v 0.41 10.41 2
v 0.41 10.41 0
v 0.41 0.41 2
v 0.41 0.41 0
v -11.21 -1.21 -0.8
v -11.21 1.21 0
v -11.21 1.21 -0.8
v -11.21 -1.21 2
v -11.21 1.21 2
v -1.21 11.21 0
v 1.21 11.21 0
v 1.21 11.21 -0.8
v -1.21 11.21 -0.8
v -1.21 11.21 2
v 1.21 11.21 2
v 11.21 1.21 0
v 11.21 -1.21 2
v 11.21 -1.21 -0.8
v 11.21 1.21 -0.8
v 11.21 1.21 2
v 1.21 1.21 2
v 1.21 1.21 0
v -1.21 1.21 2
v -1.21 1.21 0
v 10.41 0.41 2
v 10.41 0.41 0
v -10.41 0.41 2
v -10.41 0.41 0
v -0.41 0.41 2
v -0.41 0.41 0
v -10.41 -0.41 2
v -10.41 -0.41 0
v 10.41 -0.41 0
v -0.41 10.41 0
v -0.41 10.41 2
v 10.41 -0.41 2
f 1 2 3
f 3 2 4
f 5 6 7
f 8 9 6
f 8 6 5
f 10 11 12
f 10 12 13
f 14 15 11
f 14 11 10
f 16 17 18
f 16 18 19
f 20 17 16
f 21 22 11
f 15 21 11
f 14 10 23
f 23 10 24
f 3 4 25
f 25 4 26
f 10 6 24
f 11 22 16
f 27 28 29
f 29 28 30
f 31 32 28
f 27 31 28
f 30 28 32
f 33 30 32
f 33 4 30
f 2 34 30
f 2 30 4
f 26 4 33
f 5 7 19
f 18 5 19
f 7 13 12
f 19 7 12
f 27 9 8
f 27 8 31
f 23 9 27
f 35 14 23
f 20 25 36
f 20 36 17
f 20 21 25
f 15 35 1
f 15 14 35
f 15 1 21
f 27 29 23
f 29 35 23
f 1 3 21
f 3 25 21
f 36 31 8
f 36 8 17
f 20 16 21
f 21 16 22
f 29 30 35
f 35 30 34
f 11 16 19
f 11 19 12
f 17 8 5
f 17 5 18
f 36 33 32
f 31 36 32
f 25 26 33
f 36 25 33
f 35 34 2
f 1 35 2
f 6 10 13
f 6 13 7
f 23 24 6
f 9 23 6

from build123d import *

# Parameters (mm, degrees)
F0_W     = 0.82
F0_H     = 0.8
F1_DEPTH = 2
F2_DEPTH = 0.8


with BuildPart() as f1:
    # F0 (on Top) → F1 (new body)
    with BuildSketch(Plane.XY):
        Polygon((-10.41, 0.41), (-0.41, 0.41), (-0.41, 10.41), (0.41, 10.41), (0.41, 0.41), (10.41, 0.41), (10.41, -0.41), (0.41, -0.41), (0.41, -1.21), (1.21, -1.21), (11.21, -1.21), (11.21, 1.21), (1.21, 1.21), (1.21, 11.21), (-1.21, 11.21), (-1.21, 1.21), (-11.21, 1.21), (-11.21, -1.21), (-1.21, -1.21), (-0.41, -1.21), (-0.41, -0.41), (-10.41, -0.41), align=None)
        with Locations((0, -0.81)):
            Rectangle(F0_W, F0_H)
    extrude(amount=F1_DEPTH)

    # F0 (on Top) + F1_face (on face) → F2 (join)
    with BuildSketch(Plane.XY):
        Polygon((-1.21, 11.21), (-11.21, 1.21), (-1.21, 1.21), align=None)
        Polygon((1.21, 1.21), (11.21, 1.21), (1.21, 11.21), align=None)
        Polygon((-10.41, 0.41), (-0.41, 0.41), (-0.41, 10.41), (0.41, 10.41), (0.41, 0.41), (10.41, 0.41), (10.41, -0.41), (0.41, -0.41), (0.41, -1.21), (1.21, -1.21), (11.21, -1.21), (11.21, 1.21), (1.21, 1.21), (1.21, 11.21), (-1.21, 11.21), (-1.21, 1.21), (-11.21, 1.21), (-11.21, -1.21), (-1.21, -1.21), (-0.41, -1.21), (-0.41, -0.41), (-10.41, -0.41), align=None)
        Polygon((-0.41, 10.41), (-0.41, 0.41), (-10.41, 0.41), (-10.41, -0.41), (-0.41, -0.41), (0.41, -0.41), (10.41, -0.41), (10.41, 0.41), (0.41, 0.41), (0.41, 10.41), align=None)
        with Locations((0, -0.81)):
            Rectangle(F0_W, F0_H)
    with BuildSketch(Plane(origin=(0, 1.991576, 2), x_dir=(1, 0, 0), z_dir=(0, 0, 1))):
        Polygon((11.21, -3.201576), (11.21, -0.781576), (1.21, -0.781576), (1.21, 9.218424), (-1.21, 9.218424), (-1.21, -0.781576), (-11.21, -0.781576), (-11.21, -3.201576), align=None)
        Polygon((-10.41, -2.401576), (-10.41, -1.581576), (-0.41, -1.581576), (-0.41, 8.418424), (0.41, 8.418424), (0.41, -1.581576), (10.41, -1.581576), (10.41, -2.401576), align=None, mode=Mode.SUBTRACT)
    extrude(amount=-F2_DEPTH)


solid = f1.part
